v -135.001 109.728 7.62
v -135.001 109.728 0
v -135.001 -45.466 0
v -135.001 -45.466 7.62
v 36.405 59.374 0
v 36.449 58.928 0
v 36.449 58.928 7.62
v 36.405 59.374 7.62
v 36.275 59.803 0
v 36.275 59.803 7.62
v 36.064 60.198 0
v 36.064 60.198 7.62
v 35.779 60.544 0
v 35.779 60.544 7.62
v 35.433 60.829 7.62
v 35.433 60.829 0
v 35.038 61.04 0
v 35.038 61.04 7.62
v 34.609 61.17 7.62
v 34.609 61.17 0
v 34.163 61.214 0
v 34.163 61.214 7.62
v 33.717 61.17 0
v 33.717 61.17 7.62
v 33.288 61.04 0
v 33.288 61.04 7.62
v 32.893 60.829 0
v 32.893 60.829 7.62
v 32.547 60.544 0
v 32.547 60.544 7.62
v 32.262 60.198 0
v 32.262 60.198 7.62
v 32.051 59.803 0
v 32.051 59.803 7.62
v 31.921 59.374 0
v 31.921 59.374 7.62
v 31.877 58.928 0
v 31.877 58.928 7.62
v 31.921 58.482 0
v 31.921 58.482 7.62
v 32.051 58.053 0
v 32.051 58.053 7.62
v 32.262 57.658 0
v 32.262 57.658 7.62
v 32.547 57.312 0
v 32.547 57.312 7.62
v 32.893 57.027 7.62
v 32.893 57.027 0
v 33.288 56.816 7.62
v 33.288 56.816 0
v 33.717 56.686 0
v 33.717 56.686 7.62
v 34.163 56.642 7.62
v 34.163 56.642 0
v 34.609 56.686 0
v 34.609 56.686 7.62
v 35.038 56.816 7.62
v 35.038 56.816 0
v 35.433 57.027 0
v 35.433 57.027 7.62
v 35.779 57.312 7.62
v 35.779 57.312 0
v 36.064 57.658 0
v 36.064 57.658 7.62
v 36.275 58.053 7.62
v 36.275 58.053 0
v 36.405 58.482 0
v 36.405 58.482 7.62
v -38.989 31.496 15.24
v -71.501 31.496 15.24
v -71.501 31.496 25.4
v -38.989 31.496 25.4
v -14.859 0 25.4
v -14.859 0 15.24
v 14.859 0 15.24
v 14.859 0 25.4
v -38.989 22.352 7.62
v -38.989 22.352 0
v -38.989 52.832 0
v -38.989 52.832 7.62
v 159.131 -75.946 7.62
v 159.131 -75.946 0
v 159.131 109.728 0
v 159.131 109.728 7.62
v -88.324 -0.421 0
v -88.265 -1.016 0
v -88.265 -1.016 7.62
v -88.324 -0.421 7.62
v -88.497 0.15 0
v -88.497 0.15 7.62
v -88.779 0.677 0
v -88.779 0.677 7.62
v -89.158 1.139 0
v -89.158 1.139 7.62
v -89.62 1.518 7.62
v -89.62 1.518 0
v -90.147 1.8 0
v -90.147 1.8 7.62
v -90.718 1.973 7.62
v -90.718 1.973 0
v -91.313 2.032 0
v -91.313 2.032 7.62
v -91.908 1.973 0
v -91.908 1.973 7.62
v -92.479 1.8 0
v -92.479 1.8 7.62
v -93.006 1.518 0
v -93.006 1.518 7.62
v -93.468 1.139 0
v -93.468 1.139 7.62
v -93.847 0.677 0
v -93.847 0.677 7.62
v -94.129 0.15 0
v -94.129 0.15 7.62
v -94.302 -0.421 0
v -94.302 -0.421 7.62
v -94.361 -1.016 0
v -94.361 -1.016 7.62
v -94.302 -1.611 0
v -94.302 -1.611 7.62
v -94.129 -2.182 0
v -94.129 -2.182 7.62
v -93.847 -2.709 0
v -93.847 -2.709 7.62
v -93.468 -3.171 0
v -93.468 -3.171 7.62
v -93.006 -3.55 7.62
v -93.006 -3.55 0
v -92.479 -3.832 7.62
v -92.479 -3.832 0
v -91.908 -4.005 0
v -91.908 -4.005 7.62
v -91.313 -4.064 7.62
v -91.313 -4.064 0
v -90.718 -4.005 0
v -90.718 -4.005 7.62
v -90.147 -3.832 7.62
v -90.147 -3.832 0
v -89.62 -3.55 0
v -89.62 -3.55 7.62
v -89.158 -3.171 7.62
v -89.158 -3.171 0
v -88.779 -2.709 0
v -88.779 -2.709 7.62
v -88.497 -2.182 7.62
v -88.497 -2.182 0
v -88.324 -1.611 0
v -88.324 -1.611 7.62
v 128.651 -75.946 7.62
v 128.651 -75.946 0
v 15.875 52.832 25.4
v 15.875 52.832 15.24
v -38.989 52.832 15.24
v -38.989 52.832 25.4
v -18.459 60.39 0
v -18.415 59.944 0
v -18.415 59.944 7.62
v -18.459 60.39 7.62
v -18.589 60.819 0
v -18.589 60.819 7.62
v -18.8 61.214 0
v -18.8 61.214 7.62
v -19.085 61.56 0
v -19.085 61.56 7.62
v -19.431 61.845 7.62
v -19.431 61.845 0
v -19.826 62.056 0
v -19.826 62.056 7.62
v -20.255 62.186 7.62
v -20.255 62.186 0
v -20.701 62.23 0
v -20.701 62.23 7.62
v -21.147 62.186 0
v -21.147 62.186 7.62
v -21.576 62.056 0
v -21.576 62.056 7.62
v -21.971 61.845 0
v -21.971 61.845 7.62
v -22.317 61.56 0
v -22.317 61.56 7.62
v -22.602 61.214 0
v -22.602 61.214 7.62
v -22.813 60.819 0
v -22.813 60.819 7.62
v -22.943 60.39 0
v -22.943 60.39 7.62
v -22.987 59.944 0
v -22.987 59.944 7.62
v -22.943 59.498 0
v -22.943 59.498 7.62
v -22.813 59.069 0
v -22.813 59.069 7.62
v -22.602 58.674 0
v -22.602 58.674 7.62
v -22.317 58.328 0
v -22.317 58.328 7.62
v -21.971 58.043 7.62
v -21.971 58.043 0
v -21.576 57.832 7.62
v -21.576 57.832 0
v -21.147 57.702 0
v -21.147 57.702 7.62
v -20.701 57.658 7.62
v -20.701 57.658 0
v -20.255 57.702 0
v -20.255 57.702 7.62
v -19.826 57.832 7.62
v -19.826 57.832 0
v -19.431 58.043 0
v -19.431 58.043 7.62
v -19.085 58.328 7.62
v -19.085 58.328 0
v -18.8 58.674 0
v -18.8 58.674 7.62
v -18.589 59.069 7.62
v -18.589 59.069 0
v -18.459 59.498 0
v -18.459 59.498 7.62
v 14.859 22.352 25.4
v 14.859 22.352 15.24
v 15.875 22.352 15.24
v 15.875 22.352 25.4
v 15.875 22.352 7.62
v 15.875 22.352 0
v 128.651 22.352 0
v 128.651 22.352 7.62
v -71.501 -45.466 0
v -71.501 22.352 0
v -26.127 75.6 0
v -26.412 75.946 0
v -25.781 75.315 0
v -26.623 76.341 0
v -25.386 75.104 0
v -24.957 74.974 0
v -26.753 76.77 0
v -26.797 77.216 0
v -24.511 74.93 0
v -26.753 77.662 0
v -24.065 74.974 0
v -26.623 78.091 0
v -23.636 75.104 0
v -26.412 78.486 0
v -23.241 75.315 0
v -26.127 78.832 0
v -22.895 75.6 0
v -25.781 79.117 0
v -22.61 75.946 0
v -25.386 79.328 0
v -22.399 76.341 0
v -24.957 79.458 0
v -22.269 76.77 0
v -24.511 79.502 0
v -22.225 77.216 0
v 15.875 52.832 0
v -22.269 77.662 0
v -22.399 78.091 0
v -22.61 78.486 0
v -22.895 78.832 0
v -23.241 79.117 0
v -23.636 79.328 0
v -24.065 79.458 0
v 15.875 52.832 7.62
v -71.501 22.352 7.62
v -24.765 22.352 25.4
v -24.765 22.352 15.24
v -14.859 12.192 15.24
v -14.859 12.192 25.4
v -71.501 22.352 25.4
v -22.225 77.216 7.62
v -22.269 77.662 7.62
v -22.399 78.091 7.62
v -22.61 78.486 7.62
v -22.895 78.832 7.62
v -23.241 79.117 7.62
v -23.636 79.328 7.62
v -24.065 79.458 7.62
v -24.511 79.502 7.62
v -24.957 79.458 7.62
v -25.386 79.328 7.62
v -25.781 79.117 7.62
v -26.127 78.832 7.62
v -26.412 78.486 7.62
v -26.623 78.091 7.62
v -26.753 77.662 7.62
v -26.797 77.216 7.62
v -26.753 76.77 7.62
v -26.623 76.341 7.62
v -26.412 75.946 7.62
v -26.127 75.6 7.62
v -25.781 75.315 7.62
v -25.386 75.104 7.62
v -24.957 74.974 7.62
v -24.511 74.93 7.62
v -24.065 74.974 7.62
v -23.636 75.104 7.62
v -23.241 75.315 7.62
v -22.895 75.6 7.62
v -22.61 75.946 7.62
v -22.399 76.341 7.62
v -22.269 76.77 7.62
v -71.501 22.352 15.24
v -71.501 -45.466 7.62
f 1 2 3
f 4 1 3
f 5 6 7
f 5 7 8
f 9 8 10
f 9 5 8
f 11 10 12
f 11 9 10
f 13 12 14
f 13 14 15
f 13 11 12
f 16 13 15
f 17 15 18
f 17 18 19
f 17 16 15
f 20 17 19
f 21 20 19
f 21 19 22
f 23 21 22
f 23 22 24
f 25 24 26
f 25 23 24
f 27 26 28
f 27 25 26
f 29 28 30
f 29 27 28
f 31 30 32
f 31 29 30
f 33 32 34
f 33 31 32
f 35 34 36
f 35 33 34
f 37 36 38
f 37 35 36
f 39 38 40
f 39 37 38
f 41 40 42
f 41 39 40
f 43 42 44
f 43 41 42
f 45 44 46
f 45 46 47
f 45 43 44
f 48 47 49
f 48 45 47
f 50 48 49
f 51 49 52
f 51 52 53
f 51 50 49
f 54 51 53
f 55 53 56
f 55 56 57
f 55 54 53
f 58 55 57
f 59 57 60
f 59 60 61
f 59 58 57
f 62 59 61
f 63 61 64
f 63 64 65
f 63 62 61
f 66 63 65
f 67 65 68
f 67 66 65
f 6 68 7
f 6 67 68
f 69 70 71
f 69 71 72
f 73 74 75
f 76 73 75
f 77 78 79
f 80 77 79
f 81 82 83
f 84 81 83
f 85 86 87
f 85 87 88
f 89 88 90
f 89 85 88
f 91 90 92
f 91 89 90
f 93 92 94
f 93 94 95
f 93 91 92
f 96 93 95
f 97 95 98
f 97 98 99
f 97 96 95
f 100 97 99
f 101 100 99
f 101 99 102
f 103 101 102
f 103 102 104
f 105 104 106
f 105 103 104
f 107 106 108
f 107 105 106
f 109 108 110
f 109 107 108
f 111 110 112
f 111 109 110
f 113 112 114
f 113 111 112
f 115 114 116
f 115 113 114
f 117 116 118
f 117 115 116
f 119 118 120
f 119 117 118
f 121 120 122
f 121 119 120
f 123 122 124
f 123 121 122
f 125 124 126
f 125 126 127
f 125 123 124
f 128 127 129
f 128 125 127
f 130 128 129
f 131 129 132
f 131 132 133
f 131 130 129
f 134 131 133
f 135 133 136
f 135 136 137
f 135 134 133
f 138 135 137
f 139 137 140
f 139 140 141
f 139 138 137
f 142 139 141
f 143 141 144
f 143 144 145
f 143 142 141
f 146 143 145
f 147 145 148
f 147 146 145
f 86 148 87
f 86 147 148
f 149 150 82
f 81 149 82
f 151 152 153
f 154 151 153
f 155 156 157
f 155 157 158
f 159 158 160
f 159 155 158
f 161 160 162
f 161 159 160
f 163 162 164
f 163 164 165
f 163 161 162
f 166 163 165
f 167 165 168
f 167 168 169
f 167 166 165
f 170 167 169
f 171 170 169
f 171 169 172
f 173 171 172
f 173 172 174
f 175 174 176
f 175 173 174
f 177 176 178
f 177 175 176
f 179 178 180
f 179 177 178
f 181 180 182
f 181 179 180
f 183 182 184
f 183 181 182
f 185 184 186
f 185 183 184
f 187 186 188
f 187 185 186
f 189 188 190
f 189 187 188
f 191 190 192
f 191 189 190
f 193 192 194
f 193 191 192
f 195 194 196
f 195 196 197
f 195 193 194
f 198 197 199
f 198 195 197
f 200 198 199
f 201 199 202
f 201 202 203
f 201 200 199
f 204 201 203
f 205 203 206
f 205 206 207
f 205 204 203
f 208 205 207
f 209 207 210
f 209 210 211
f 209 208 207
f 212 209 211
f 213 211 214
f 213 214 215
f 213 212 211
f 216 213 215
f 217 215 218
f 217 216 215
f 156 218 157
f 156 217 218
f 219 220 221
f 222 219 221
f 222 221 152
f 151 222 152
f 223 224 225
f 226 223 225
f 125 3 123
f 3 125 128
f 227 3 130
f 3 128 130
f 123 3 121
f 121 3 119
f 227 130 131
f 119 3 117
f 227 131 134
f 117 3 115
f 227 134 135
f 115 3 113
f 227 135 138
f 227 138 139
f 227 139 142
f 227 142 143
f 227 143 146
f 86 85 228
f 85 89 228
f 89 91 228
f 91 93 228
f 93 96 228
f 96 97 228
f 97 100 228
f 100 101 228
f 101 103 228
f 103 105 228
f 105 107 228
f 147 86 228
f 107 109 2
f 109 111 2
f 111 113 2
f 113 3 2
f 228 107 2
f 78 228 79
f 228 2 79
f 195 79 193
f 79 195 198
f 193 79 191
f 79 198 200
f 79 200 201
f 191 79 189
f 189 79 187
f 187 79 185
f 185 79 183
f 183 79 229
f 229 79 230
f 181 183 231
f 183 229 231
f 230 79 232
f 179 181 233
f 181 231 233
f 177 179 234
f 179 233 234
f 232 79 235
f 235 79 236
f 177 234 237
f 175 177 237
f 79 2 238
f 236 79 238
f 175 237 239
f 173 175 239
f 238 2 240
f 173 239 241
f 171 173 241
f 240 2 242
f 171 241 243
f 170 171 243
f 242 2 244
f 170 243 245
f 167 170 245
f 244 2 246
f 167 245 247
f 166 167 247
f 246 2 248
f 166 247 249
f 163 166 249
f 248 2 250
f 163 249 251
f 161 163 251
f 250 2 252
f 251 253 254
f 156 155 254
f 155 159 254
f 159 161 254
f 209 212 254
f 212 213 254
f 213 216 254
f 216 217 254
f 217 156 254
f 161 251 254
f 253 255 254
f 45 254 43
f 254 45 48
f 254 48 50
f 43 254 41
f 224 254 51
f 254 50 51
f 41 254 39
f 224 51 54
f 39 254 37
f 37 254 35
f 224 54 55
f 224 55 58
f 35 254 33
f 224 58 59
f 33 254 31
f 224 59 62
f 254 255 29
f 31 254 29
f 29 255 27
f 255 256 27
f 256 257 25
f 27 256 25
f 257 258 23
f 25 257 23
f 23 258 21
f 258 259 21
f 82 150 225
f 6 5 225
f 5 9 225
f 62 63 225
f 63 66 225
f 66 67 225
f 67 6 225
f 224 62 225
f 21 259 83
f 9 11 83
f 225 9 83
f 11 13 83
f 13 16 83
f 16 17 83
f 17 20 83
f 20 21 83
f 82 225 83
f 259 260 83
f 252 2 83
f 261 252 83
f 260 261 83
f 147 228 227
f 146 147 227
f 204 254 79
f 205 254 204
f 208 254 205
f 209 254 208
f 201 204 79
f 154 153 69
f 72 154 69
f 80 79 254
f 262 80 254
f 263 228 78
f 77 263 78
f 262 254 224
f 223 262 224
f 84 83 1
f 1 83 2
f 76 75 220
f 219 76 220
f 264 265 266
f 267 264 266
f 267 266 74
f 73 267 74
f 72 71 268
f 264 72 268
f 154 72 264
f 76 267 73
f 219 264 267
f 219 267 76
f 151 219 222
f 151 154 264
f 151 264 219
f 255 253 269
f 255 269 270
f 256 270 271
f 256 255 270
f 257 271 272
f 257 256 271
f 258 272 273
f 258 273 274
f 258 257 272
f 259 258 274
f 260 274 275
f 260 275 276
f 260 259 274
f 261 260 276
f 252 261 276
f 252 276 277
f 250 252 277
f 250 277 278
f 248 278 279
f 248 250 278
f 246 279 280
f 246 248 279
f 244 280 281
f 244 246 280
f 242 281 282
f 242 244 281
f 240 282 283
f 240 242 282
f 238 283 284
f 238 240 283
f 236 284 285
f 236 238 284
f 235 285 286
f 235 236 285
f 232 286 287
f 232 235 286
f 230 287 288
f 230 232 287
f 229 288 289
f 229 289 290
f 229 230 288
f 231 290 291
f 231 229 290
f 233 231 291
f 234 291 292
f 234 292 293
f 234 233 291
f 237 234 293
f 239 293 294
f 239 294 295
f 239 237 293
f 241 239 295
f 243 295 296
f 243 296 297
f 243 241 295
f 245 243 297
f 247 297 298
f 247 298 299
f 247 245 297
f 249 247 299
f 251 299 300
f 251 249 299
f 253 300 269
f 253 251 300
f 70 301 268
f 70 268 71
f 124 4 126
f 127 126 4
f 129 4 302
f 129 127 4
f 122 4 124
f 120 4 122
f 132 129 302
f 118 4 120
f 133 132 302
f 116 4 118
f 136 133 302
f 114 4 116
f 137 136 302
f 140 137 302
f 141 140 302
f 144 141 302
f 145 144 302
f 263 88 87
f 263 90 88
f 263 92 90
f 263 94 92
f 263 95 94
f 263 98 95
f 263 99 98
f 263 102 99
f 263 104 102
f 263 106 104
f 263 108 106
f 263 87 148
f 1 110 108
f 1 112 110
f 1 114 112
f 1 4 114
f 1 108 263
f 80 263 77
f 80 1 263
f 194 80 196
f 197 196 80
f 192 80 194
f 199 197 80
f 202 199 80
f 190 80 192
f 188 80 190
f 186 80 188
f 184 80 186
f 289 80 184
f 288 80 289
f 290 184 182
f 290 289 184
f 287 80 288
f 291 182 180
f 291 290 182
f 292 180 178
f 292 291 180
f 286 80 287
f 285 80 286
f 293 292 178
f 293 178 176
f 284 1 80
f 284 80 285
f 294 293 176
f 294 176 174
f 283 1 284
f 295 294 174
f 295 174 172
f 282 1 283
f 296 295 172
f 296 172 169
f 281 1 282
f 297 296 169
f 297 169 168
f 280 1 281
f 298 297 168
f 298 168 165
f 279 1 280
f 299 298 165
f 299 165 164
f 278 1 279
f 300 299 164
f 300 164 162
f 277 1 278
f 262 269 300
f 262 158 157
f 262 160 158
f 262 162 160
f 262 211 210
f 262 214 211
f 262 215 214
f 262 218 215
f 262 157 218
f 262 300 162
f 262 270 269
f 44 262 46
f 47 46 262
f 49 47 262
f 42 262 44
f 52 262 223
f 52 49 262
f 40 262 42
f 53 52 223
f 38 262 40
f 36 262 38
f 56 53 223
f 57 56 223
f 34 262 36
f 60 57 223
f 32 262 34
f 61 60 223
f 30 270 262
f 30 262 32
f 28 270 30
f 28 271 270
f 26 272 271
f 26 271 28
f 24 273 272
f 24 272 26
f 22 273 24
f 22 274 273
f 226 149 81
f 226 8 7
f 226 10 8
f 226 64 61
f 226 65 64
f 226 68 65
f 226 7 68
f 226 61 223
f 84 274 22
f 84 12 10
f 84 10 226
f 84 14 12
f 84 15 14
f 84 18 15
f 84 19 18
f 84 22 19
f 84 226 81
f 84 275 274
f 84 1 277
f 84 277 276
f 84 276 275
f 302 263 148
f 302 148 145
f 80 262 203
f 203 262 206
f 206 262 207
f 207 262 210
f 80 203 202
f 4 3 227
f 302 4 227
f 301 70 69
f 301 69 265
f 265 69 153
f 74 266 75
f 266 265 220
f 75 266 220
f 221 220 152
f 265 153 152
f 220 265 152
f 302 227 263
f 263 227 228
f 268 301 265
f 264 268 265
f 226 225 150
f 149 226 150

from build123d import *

# Parameters (mm, degrees)
F0_R     = 3.048
F0_R_2   = 2.286
F2_DEPTH = 7.62
F3_W     = 32.512
F3_H     = 9.144
F4_DEPTH = 10.16


with BuildPart() as f2:
    # F0 (on Top) → F2 (new body)
    with BuildSketch(Plane.XY):
        Polygon((15.875, 52.832), (15.875, 22.352), (128.651, 22.352), (128.651, -45.466), (128.651, -75.946), (159.131, -75.946), (159.131, 109.728), (-135.001, 109.728), (-135.001, -45.466), (-71.501, -45.466), (-71.501, 22.352), (-38.989, 22.352), (-38.989, 52.832), align=None)
        with Locations((-91.313, -1.016)):
            Circle(F0_R, mode=Mode.SUBTRACT)
        with Locations((-20.701, 59.944)):
            Circle(F0_R_2, mode=Mode.SUBTRACT)
        with Locations((-24.511, 77.216)):
            Circle(F0_R_2, mode=Mode.SUBTRACT)
        with Locations((34.163, 58.928)):
            Circle(F0_R_2, mode=Mode.SUBTRACT)
    extrude(amount=F2_DEPTH)


with BuildPart() as f4:
    # F3 (on offset) → F4 (new body)
    with BuildSketch(Plane.XY.offset(15.24)):
        with Locations((-55.245, 26.924)):
            Rectangle(F3_W, F3_H)
        Polygon((14.859, 22.352), (-24.765, 22.352), (-14.859, 12.192), (-14.859, 0), (14.859, 0), align=None)
        Polygon((-38.989, 31.496), (-38.989, 22.352), (-24.765, 22.352), (14.859, 22.352), (15.875, 22.352), (15.875, 52.832), (-38.989, 52.832), align=None)
    extrude(amount=F4_DEPTH)


solid = Compound([f2.part, f4.part])
